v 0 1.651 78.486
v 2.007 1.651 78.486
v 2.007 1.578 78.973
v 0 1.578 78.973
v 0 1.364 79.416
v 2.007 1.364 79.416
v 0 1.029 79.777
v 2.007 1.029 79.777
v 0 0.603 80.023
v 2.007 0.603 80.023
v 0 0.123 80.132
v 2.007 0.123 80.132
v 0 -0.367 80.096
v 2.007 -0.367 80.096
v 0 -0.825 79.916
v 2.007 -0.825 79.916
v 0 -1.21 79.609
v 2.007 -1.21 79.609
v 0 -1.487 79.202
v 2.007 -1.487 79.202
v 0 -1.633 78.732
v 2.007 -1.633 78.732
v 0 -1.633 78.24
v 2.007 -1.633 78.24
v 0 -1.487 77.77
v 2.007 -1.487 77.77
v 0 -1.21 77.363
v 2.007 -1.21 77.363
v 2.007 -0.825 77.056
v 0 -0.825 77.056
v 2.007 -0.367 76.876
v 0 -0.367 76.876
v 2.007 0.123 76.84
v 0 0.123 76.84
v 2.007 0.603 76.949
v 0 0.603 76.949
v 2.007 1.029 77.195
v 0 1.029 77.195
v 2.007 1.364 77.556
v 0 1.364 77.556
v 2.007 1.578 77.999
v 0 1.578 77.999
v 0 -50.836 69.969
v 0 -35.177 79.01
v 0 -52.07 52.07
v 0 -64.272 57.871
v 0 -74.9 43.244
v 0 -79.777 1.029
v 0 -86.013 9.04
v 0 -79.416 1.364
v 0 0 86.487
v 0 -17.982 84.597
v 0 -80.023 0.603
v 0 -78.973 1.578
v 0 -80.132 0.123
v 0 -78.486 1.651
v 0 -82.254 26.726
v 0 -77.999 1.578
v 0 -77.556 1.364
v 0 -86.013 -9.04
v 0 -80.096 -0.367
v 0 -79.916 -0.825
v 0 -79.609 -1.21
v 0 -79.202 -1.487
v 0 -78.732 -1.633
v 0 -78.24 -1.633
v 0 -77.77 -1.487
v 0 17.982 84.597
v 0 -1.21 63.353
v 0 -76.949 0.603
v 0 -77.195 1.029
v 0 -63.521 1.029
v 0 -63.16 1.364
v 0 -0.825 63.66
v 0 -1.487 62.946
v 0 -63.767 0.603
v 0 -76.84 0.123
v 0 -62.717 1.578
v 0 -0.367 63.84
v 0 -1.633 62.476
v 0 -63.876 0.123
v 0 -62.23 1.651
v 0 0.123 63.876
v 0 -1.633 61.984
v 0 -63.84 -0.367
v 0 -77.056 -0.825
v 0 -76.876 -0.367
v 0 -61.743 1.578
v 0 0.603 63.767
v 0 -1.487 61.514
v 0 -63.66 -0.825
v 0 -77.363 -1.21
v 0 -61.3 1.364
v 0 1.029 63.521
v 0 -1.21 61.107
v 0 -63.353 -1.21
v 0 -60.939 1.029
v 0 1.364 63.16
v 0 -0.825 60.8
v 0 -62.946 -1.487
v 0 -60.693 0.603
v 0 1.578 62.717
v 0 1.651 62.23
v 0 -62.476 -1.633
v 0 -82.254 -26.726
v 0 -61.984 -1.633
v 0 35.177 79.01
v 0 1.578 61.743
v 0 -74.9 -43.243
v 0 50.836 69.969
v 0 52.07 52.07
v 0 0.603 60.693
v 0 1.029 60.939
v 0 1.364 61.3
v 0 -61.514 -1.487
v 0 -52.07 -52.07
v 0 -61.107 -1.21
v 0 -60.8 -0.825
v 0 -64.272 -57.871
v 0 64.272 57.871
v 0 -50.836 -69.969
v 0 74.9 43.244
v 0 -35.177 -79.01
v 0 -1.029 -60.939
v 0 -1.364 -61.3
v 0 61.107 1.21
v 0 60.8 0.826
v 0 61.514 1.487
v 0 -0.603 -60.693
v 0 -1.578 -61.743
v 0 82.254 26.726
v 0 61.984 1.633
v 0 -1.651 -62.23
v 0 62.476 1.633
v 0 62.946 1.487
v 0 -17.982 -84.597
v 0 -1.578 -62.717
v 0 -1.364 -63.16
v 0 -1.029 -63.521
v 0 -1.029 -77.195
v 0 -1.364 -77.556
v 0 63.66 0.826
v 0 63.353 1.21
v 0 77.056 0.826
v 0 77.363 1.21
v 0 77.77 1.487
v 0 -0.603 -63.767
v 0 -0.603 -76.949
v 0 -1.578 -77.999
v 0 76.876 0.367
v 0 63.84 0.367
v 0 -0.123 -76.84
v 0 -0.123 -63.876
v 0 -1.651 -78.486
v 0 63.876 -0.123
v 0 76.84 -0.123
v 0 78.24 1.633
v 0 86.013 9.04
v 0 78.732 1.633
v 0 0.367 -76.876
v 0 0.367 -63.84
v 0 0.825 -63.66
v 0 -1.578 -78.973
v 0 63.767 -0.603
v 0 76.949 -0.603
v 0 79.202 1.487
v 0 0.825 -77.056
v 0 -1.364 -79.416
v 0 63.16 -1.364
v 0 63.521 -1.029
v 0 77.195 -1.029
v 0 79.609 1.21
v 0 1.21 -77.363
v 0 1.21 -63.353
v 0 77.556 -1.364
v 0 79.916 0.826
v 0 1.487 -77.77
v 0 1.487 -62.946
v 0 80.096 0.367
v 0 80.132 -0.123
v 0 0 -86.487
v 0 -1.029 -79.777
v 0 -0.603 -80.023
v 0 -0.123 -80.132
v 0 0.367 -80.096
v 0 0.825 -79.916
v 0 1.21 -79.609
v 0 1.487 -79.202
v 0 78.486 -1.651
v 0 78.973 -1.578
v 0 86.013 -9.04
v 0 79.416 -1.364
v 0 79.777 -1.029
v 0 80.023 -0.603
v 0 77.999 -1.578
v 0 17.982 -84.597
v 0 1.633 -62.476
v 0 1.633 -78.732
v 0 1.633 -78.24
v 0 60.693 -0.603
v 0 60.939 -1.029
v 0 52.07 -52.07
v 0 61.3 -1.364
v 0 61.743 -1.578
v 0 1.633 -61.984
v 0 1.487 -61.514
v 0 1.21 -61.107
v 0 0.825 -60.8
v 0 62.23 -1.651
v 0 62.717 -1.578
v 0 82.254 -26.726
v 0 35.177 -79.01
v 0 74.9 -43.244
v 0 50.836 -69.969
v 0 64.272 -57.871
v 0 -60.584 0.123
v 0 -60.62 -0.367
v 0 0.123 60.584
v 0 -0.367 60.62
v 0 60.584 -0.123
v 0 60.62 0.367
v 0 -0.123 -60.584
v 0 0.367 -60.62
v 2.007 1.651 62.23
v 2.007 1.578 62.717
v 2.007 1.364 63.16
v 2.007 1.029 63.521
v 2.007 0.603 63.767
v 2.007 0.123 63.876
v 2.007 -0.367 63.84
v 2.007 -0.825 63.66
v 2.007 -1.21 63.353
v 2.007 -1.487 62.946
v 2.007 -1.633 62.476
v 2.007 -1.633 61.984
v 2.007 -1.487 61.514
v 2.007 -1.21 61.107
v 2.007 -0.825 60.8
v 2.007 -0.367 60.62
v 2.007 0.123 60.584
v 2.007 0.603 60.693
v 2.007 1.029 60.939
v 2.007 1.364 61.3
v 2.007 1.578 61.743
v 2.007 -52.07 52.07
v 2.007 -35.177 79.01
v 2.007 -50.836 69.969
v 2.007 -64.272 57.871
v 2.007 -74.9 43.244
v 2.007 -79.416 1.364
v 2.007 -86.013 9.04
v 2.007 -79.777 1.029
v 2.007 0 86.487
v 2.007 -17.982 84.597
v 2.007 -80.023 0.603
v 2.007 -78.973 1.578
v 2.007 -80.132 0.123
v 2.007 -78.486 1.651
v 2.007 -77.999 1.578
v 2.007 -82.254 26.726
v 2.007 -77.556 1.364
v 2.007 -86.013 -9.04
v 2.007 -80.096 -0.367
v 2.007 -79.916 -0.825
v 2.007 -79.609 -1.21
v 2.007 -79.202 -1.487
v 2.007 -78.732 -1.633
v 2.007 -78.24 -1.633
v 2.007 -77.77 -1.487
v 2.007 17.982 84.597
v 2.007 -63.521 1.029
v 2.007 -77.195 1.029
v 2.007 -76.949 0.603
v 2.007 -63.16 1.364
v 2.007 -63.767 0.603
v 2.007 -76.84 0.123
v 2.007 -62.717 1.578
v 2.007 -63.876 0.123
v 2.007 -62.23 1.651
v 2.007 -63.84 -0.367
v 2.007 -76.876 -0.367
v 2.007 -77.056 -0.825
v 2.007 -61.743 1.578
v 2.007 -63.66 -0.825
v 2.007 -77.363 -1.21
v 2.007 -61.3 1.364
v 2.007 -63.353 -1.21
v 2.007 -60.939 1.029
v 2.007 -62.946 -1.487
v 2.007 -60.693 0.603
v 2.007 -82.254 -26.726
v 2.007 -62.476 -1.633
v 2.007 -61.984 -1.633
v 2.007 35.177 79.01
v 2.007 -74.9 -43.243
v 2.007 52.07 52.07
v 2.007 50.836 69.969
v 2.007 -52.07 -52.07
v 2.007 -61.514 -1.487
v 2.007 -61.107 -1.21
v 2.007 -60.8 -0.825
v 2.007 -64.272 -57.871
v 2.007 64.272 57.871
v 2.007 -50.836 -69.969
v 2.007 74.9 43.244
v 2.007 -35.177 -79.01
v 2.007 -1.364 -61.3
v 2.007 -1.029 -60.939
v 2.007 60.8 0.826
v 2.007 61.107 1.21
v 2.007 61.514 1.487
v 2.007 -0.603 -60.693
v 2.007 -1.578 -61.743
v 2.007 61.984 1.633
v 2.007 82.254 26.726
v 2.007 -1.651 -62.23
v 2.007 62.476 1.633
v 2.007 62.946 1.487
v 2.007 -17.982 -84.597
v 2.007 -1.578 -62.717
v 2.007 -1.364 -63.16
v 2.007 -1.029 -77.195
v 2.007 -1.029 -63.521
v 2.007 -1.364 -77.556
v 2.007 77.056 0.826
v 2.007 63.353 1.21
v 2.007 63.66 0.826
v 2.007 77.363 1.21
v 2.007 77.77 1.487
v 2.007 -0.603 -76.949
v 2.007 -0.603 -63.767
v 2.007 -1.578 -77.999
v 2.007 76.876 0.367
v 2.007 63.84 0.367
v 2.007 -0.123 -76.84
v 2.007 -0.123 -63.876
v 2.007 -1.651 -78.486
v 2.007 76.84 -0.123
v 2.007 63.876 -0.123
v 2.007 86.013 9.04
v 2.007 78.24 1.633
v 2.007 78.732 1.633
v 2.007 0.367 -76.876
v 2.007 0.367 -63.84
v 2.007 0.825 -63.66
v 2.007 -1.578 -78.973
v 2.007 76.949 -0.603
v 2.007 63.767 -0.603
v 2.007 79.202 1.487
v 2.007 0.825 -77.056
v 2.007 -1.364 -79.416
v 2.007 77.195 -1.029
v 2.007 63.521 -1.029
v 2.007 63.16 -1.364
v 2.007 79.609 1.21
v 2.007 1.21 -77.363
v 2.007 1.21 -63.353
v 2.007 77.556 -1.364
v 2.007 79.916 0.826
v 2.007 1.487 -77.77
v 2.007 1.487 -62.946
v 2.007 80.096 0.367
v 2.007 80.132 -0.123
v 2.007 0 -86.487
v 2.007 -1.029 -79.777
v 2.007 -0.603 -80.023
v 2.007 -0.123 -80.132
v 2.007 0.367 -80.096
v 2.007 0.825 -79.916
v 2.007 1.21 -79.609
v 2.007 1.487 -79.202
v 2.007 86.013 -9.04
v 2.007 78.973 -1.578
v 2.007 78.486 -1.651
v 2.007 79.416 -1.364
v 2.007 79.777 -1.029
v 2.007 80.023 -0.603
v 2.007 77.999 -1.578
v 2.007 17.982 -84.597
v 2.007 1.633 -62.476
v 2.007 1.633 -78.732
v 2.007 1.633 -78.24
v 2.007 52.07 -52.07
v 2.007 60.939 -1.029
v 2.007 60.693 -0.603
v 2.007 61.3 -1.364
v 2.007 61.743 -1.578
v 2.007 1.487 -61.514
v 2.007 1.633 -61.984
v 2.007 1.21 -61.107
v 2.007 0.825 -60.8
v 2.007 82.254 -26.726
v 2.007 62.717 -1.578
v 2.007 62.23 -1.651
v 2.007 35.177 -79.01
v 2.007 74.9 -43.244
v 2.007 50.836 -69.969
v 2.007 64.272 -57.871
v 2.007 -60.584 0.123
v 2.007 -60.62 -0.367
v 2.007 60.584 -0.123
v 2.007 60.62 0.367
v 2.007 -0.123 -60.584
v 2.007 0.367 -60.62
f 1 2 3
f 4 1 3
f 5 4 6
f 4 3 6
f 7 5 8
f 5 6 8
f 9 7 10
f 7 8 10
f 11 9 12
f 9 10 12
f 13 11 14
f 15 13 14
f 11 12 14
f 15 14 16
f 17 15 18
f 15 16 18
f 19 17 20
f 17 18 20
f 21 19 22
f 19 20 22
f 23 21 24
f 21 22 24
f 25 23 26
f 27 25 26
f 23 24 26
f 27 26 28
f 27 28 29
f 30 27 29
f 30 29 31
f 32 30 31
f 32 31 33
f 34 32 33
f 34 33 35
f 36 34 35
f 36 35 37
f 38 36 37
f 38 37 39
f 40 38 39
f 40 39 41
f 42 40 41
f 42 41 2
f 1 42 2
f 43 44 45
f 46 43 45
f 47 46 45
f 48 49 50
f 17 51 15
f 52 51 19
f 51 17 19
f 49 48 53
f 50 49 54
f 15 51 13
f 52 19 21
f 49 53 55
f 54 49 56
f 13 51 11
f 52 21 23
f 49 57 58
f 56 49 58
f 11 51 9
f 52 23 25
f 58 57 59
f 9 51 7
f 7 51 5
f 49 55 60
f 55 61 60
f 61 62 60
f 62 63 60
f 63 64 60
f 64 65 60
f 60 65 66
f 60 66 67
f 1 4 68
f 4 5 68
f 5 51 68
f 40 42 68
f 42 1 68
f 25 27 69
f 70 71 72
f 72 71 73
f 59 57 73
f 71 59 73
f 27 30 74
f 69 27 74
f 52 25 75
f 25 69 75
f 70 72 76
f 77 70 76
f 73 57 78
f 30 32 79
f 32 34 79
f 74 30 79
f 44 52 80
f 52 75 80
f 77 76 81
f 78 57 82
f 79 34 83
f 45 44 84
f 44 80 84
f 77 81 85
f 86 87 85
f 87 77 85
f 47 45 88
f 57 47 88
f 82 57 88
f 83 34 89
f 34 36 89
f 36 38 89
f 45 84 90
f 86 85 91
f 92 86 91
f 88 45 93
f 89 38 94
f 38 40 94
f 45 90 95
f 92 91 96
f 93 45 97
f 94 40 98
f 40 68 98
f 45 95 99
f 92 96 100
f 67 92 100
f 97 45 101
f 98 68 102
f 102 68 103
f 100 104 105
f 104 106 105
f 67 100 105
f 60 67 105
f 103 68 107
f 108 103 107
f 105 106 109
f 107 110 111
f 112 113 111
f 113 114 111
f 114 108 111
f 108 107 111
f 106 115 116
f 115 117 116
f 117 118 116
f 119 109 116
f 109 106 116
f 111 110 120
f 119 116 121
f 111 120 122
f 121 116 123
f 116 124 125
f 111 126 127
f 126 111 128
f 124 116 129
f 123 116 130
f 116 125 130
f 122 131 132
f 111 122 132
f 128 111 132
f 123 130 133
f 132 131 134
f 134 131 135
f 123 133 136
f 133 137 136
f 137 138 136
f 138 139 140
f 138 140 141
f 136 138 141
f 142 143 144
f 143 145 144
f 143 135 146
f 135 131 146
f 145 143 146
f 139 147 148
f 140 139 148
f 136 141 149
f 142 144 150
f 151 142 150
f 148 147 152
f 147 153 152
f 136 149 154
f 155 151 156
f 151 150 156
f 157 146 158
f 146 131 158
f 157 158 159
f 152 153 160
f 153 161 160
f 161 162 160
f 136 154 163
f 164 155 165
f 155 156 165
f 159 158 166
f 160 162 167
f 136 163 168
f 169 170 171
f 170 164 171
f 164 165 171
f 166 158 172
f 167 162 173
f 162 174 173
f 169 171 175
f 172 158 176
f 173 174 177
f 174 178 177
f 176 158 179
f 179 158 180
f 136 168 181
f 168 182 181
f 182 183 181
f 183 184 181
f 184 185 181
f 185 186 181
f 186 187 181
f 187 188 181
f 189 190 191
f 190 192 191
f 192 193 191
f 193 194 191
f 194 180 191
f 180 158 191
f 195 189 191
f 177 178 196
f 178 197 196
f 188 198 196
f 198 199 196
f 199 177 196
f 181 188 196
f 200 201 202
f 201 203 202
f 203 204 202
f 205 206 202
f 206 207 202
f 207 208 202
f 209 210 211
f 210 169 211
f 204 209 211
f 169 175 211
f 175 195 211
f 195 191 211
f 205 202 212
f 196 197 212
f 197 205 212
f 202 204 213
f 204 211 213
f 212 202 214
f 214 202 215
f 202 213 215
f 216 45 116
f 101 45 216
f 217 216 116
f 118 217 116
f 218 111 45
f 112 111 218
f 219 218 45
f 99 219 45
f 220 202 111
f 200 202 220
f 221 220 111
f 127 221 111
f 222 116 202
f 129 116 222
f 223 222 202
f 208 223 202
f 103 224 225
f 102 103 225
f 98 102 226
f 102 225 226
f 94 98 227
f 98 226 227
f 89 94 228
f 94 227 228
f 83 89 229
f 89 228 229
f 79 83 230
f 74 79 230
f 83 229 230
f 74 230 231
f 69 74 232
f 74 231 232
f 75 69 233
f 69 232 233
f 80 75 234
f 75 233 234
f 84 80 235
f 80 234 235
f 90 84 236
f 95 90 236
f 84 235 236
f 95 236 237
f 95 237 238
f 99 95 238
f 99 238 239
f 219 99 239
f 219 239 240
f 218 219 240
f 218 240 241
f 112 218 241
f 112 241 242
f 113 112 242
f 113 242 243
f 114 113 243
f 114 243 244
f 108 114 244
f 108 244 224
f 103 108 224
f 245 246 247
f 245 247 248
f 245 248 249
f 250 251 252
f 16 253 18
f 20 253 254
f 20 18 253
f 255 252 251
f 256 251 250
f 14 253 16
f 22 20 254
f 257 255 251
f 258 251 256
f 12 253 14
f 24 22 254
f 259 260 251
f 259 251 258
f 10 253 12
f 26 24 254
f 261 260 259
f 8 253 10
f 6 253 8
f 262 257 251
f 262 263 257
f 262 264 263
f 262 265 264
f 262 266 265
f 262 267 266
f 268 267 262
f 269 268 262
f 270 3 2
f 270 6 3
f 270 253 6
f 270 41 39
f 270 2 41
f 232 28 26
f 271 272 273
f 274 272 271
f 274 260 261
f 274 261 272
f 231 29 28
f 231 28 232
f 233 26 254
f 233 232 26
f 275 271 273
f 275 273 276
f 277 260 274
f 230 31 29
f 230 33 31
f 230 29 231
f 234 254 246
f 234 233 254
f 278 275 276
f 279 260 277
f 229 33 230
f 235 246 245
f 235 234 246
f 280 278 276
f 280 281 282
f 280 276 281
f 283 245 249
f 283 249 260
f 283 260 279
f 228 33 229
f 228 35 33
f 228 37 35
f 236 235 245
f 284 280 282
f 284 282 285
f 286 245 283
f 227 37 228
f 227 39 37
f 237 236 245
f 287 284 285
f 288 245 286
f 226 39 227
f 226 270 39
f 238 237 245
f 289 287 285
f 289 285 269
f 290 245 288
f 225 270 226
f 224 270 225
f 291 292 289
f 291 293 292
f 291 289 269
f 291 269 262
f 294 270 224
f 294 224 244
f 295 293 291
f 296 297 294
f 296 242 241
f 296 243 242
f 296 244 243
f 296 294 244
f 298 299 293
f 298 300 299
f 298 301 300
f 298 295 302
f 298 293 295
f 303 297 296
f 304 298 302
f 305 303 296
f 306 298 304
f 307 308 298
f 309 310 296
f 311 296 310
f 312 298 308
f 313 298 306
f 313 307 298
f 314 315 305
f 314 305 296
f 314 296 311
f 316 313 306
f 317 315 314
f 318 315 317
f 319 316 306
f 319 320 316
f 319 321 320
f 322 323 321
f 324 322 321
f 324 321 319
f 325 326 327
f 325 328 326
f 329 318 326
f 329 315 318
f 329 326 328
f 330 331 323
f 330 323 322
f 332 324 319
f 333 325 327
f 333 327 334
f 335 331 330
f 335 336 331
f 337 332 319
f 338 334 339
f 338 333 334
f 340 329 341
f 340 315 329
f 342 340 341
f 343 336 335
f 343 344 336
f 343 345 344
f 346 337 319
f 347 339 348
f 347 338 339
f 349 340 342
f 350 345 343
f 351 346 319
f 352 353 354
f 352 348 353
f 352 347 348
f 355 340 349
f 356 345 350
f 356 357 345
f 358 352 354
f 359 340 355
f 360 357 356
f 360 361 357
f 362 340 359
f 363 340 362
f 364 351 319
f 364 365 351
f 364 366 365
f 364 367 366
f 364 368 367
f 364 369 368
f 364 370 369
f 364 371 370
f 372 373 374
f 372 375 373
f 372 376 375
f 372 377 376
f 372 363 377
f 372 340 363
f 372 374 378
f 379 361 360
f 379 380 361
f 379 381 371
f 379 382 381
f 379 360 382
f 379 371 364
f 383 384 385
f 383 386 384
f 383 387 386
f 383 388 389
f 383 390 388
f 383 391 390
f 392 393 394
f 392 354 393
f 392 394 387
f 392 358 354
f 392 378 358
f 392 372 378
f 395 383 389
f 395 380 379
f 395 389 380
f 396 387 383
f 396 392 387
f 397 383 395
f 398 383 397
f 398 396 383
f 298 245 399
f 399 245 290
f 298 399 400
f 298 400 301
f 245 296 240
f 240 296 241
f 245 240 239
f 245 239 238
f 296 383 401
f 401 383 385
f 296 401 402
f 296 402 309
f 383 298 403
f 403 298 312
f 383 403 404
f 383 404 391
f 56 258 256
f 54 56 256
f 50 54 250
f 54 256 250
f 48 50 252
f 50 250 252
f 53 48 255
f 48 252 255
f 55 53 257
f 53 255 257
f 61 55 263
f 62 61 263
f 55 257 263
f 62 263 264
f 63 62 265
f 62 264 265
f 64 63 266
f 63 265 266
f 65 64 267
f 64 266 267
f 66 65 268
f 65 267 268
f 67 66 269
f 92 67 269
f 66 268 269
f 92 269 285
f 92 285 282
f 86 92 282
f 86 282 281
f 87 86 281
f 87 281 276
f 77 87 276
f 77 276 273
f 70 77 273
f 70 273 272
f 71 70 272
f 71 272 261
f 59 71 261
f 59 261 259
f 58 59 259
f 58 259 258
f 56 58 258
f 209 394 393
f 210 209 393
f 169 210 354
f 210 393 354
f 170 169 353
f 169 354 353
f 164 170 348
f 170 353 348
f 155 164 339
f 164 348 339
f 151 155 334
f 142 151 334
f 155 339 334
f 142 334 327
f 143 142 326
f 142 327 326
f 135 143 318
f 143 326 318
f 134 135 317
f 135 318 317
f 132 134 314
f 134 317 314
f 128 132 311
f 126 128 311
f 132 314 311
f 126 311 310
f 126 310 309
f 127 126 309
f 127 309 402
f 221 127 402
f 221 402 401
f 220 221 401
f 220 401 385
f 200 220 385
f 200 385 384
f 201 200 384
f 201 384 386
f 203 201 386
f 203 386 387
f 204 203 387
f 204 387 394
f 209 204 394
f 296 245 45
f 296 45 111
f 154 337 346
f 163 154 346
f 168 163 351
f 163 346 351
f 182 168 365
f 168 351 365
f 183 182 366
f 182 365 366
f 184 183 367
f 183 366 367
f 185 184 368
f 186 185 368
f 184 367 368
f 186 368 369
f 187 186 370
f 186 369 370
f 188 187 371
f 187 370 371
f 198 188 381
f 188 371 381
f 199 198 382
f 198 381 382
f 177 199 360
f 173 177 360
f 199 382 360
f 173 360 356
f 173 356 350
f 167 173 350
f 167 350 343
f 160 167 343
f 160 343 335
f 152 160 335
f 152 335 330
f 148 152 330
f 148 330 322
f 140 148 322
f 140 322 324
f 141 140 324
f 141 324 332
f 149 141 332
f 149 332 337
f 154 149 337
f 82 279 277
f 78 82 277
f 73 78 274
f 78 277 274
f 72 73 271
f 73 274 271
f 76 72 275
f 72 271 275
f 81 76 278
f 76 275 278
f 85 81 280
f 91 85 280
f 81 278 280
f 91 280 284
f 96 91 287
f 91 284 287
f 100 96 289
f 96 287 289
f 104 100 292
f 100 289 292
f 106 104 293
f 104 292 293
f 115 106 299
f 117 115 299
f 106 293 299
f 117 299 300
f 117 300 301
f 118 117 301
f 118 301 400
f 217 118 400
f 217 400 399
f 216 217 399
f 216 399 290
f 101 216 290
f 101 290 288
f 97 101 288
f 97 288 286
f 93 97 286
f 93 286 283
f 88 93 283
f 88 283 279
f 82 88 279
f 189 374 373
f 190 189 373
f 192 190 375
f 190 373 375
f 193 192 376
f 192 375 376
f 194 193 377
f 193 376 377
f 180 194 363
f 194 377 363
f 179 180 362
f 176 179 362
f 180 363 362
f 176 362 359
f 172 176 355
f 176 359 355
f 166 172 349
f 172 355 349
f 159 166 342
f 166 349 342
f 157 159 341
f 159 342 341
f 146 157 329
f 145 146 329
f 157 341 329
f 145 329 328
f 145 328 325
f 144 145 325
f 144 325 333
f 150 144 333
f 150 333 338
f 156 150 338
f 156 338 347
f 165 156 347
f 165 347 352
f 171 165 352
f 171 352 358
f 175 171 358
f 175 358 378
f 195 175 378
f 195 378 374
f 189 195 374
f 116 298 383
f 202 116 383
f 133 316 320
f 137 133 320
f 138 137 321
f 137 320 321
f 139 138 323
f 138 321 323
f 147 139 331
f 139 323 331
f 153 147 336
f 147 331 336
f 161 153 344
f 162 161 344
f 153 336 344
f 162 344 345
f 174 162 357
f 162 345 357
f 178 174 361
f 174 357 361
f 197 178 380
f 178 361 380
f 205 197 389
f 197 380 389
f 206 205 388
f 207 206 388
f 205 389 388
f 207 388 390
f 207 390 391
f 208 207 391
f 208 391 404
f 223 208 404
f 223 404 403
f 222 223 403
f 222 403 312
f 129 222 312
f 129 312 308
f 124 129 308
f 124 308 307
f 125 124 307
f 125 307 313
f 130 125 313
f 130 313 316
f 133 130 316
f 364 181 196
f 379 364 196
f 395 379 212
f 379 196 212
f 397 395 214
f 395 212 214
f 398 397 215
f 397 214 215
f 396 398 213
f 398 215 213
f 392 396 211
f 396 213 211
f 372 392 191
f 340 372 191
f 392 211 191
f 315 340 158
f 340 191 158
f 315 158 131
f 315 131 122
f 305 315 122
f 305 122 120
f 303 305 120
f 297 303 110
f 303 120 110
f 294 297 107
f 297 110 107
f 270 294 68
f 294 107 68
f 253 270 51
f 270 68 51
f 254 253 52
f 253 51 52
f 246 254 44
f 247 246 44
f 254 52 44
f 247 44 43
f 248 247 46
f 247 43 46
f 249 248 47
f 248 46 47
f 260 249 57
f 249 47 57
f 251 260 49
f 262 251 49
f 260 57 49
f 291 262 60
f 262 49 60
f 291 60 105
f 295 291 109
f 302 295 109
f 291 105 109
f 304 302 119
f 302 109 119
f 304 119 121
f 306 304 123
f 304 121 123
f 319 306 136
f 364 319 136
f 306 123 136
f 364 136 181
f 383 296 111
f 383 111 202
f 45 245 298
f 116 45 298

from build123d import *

# Parameters (mm, degrees)
SKETCH1_R           = 86.487
BOSS_EXTRUDE1_DEPTH = 2.0066
SKETCH6_W           = 104.14
SKETCH6_H           = 104.14
CUT_EXTRUDE2_DEPTH  = 123.327547108
SKETCH7_R           = 1.651
CUT_EXTRUDE3_DEPTH  = 123.327547108
CIRPATTERN1_COUNT   = 4


with BuildPart() as part:
    # Sketch1 → Boss-Extrude1 (new body)
    with BuildSketch(Plane.YZ):
        with Locations(Location((0, 0, 0), (0, 0, 270))):
            Circle(SKETCH1_R)
    extrude(amount=BOSS_EXTRUDE1_DEPTH)

    # Sketch6 → Cut-Extrude2 (cut, through all)
    with BuildSketch(Plane(origin=(2.0066, 0, 0), x_dir=(0, 0, -1), z_dir=(1, 0, 0))):
        Rectangle(SKETCH6_W, SKETCH6_H)
    extrude(amount=-CUT_EXTRUDE2_DEPTH, mode=Mode.SUBTRACT)

    # Sketch7 → Cut-Extrude3 (cut, through all)
    with BuildSketch(Plane.YZ.offset(2.0066)):
        with Locations(Location((62.23, 0, 0), (0, 0, 270))):
            Circle(SKETCH7_R)
        with Locations(Location((78.486, 0, 0), (0, 0, 270))):
            Circle(SKETCH7_R)
    cut_extrude3 = extrude(amount=-CUT_EXTRUDE3_DEPTH, mode=Mode.SUBTRACT)

    # CirPattern1: Cut-Extrude3 ×4 about axis
    cirpattern1_axis = Axis((0, 0, 0), (1, 0, 0))
    for i in range(1, CIRPATTERN1_COUNT):
        add(cut_extrude3.rotate(cirpattern1_axis, i * 360 / CIRPATTERN1_COUNT), mode=Mode.SUBTRACT)


solid = part.part
